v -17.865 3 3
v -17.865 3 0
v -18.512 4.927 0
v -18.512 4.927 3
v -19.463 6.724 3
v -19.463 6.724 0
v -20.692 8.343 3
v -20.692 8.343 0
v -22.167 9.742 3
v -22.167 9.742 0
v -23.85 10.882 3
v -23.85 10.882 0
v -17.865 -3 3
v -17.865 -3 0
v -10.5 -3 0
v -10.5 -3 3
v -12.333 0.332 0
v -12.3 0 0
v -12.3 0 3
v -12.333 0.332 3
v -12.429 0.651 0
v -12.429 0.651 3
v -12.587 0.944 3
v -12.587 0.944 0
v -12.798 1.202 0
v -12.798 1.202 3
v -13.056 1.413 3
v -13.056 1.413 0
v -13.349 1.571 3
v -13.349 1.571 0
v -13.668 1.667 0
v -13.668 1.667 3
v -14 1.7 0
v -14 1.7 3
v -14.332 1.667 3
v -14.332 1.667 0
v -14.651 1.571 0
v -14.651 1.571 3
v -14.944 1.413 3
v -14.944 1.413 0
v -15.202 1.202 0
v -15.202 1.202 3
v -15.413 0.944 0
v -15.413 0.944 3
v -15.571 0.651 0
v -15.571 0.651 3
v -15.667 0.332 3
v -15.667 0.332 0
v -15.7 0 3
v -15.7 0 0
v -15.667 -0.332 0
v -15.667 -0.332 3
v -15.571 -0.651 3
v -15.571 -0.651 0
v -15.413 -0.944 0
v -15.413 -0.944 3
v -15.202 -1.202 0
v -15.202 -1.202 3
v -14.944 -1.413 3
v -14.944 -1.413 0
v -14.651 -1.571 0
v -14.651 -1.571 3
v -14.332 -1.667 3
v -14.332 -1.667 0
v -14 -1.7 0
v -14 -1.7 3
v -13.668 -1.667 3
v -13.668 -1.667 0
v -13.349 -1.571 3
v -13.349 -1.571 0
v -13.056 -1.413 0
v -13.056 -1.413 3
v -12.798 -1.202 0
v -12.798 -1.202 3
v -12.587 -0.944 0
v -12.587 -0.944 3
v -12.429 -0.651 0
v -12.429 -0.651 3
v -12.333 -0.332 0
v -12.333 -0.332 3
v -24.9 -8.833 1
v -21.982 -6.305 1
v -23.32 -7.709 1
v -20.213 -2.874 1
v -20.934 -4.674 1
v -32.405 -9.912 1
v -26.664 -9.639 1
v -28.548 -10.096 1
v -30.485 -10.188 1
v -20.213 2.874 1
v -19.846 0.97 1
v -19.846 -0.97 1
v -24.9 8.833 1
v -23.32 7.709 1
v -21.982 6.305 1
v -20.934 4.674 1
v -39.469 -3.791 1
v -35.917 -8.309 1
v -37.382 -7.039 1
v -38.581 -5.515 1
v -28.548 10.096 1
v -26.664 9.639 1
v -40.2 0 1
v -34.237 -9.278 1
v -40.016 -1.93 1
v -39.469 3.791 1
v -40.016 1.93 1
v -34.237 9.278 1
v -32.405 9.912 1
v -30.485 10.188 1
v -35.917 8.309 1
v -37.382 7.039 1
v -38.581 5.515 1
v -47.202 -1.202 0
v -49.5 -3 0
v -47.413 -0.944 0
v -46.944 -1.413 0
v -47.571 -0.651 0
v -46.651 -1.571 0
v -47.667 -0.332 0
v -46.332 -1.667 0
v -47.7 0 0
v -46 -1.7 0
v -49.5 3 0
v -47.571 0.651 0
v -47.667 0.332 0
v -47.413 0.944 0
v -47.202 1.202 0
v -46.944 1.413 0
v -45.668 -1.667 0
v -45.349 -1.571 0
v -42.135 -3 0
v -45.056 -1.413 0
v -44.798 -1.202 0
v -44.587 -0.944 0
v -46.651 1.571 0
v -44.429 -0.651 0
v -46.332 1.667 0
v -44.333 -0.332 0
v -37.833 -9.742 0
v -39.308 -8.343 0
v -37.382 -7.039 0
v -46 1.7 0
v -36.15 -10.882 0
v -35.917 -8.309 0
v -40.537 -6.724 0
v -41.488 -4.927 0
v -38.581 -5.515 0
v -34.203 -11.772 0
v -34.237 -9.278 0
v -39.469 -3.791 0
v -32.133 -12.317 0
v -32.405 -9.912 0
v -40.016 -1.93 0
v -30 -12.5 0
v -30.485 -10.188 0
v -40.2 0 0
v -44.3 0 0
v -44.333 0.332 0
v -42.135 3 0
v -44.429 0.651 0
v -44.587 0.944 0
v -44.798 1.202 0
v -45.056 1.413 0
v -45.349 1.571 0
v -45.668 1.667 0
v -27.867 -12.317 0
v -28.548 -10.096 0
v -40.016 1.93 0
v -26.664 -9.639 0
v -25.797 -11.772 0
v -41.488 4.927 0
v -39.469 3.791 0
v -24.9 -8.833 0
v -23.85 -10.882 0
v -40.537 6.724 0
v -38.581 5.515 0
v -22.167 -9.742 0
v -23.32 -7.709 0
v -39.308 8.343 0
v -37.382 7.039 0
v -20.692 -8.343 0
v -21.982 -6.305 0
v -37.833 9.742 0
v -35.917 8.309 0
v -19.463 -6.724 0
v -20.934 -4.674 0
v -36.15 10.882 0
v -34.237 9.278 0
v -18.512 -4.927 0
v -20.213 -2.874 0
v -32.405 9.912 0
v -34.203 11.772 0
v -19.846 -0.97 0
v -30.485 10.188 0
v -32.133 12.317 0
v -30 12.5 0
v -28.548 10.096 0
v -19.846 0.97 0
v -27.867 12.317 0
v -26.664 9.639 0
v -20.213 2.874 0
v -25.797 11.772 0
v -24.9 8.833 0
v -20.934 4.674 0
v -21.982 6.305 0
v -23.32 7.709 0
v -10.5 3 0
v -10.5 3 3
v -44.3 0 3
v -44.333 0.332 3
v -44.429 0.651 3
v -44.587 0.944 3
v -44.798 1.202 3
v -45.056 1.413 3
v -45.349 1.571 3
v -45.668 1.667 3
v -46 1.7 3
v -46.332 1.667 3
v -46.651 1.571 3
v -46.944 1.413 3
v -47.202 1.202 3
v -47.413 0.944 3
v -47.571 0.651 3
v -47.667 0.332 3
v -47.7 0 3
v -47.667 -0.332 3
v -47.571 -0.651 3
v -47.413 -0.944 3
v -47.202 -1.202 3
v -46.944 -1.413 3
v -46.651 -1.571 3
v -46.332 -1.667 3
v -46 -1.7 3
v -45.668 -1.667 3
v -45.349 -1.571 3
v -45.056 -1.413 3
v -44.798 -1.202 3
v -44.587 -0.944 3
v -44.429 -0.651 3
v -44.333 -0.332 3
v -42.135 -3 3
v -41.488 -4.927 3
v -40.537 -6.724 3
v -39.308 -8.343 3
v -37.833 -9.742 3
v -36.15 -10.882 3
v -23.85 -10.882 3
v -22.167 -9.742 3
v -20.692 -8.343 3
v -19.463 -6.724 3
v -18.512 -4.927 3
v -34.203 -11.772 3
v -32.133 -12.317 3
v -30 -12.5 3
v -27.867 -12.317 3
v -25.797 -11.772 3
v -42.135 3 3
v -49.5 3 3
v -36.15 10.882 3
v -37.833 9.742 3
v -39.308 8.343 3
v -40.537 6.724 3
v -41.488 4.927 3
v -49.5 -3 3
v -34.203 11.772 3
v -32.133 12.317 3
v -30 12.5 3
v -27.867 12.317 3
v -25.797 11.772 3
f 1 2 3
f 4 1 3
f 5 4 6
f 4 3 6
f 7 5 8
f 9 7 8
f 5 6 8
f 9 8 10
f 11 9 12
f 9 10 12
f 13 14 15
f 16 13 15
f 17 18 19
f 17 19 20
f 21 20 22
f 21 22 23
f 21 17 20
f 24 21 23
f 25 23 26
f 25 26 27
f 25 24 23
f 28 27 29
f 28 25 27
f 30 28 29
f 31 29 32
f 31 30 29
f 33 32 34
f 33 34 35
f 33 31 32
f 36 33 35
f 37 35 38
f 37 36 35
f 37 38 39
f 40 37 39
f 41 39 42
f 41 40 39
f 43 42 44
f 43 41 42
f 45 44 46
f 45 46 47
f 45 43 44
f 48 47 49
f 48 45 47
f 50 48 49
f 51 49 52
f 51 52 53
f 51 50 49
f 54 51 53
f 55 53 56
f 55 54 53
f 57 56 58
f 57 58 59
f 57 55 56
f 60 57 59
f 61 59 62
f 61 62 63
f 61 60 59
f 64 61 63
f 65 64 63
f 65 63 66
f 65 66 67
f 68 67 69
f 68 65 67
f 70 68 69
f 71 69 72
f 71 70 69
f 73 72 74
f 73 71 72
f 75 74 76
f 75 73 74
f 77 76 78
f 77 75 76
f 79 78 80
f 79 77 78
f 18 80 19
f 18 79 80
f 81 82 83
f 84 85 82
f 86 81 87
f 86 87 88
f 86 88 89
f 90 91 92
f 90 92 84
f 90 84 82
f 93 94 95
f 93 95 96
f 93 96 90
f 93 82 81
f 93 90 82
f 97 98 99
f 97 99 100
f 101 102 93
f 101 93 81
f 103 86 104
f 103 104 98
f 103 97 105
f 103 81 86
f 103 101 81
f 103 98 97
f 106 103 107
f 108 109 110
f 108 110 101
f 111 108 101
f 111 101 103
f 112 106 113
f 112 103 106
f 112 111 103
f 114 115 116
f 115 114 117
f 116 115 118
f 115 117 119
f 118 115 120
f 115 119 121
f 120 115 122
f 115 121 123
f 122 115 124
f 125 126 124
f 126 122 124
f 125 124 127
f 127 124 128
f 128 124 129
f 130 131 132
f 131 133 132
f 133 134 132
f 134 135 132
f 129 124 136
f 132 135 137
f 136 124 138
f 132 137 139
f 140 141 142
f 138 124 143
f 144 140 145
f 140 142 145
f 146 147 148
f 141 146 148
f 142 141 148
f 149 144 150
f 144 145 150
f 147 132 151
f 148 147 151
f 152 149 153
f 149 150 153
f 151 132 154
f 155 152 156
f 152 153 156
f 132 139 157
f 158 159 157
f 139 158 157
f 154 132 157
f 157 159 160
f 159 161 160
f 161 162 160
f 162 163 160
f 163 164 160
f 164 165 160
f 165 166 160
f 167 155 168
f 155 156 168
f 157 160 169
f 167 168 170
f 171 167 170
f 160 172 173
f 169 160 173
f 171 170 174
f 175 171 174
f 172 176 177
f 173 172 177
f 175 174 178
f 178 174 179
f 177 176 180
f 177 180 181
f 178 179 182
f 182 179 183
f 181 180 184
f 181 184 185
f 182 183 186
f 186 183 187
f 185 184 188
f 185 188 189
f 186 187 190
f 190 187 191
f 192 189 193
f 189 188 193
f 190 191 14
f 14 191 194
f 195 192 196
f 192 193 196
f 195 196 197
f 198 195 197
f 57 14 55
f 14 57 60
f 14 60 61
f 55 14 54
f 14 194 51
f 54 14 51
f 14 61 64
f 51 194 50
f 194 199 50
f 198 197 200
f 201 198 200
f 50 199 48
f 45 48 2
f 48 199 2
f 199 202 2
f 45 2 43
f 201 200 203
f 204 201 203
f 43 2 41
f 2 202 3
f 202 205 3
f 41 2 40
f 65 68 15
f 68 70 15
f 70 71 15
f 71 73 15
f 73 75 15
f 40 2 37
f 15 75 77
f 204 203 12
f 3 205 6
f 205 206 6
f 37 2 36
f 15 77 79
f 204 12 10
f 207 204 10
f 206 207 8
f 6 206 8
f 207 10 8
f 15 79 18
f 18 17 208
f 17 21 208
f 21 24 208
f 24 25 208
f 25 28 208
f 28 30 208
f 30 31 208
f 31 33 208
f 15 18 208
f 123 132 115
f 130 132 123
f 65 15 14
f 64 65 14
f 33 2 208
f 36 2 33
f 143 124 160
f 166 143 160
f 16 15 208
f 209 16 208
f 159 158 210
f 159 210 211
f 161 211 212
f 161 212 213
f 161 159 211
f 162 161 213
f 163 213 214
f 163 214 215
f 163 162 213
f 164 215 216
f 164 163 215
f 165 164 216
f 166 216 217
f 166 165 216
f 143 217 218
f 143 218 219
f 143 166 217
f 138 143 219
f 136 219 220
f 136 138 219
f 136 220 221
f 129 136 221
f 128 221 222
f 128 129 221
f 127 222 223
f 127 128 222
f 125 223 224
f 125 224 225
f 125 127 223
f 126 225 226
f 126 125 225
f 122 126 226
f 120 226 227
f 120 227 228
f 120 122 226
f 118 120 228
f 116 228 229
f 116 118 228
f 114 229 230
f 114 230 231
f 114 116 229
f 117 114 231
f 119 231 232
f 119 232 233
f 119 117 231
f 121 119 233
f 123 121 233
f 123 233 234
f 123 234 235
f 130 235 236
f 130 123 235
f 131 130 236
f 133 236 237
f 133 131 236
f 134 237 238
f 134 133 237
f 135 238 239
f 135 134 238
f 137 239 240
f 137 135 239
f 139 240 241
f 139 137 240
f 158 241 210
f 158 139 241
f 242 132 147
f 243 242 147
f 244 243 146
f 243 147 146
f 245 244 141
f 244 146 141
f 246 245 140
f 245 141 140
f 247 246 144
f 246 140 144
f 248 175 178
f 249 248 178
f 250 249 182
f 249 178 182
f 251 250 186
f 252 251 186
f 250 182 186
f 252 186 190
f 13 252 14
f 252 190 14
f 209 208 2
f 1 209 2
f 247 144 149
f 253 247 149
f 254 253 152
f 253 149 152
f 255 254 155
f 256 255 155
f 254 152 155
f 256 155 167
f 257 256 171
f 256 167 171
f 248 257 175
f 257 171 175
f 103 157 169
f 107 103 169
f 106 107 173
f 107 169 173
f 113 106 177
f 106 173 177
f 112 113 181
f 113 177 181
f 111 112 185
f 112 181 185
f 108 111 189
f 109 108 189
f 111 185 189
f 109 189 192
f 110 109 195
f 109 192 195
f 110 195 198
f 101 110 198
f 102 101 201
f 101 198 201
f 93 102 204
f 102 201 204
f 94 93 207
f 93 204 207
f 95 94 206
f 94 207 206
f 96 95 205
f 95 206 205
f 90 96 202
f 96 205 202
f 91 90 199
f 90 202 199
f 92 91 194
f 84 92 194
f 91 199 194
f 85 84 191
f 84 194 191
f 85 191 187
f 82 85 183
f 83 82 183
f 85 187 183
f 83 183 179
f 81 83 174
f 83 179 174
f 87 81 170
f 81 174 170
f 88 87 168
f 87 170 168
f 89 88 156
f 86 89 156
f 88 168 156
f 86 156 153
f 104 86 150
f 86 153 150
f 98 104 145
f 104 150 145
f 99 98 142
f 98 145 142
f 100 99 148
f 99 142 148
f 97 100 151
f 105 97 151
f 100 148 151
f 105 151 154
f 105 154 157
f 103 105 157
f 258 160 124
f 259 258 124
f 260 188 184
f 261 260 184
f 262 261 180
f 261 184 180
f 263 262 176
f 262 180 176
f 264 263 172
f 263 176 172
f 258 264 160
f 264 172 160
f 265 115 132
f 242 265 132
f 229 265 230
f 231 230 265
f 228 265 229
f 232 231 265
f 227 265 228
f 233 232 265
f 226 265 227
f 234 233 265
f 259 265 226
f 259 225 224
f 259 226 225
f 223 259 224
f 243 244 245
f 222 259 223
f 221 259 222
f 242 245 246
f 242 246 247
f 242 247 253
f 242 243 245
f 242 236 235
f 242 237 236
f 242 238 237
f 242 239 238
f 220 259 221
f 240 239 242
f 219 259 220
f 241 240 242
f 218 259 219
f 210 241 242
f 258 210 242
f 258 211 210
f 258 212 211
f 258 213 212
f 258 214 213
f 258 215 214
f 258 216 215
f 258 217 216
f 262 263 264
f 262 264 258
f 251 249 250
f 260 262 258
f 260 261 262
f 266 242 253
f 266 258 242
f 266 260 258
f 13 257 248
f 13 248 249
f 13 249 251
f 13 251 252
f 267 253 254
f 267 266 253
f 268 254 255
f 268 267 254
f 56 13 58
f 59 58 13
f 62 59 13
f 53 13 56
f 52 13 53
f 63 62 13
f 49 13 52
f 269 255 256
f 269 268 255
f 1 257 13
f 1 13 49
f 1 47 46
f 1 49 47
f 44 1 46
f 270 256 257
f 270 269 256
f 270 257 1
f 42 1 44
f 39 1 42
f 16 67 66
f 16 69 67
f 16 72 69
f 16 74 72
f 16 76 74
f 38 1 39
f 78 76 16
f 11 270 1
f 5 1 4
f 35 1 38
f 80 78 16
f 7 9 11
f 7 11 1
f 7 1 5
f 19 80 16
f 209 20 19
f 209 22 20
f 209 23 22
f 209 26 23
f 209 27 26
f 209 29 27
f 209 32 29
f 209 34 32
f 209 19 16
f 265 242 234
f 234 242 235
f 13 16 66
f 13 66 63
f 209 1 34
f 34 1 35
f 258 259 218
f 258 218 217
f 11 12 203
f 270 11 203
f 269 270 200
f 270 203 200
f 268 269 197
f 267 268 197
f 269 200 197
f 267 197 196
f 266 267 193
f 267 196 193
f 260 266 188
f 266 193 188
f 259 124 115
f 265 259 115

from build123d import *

# Parameters (mm, degrees)
SKETCH2_R           = 1.7
BOSS_EXTRUDE1_DEPTH = 3
SKETCH3_R           = 10.2
CUT_EXTRUDE1_DEPTH  = 1


with BuildPart() as part:
    # Sketch2 → Boss-Extrude1 (new body)
    # profile 1 of 7: a face of its own
    with BuildSketch(Plane.XY):
        with BuildLine():
            ThreePointArc((-17.5, 0), (-17.591670867, -1.511081774), (-17.8653389, -3))
            Line((-17.8653389, -3), (-10.5, -3))
            Line((-10.5, -3), (-10.5, 3))
            Line((-10.5, 3), (-17.8653389, 3))
            ThreePointArc((-17.8653389, 3), (-17.591670867, 1.511081774), (-17.5, 0))
        make_face()
        with Locations((-14, 0)):
            Circle(SKETCH2_R, mode=Mode.SUBTRACT)
    # profile 2 of 7: a face of its own
    with BuildSketch(Plane.XY):
        with BuildLine():
            ThreePointArc((-19.8, 0), (-20.868461247, -4.544777222), (-23.85, -8.137413594))
            Line((-23.85, -8.137413594), (-23.85, -10.882439984))
            ThreePointArc((-23.85, -10.882439984), (-20.044327099, -7.558741767), (-17.8653389, -3))
            ThreePointArc((-17.8653389, -3), (-17.591670867, -1.511081774), (-17.5, 0))
            ThreePointArc((-17.5, 0), (-17.591670867, 1.511081774), (-17.8653389, 3))
            ThreePointArc((-17.8653389, 3), (-20.044327099, 7.558741767), (-23.85, 10.882439984))
            Line((-23.85, 10.882439984), (-23.85, 8.137413594))
            ThreePointArc((-23.85, 8.137413594), (-20.868461247, 4.544777222), (-19.8, 0))
        make_face()
    # profile 3 of 7: a face of its own
    with BuildSketch(Plane.XY):
        with BuildLine():
            Line((-23.85, -10.882439984), (-23.85, -8.137413594))
            ThreePointArc((-23.85, -8.137413594), (-30, -10.2), (-36.15, -8.137413594))
            Line((-36.15, -8.137413594), (-36.15, -10.882439984))
            ThreePointArc((-36.15, -10.882439984), (-30, -12.5), (-23.85, -10.882439984))
        make_face()
    # profile 4 of 7: a face of its own
    with BuildSketch(Plane.XY):
        with BuildLine():
            Line((-36.15, -10.882439984), (-36.15, -8.137413594))
            ThreePointArc((-36.15, -8.137413594), (-40.2, 0), (-36.15, 8.137413594))
            Line((-36.15, 8.137413594), (-36.15, 10.882439984))
            ThreePointArc((-36.15, 10.882439984), (-39.955672901, 7.558741767), (-42.1346611, 3))
            ThreePointArc((-42.1346611, 3), (-42.5, 0), (-42.1346611, -3))
            ThreePointArc((-42.1346611, -3), (-39.955672901, -7.558741767), (-36.15, -10.882439984))
        make_face()
    # profile 5 of 7: a face of its own
    with BuildSketch(Plane.XY):
        with BuildLine():
            ThreePointArc((-36.15, -8.137413594), (-30, -10.2), (-23.85, -8.137413594))
            ThreePointArc((-23.85, -8.137413594), (-20.868461247, -4.544777222), (-19.8, 0))
            ThreePointArc((-19.8, 0), (-20.868461247, 4.544777222), (-23.85, 8.137413594))
            ThreePointArc((-23.85, 8.137413594), (-30, 10.2), (-36.15, 8.137413594))
            ThreePointArc((-36.15, 8.137413594), (-40.2, 0), (-36.15, -8.137413594))
        make_face()
    # profile 6 of 7: a face of its own
    with BuildSketch(Plane.XY):
        with BuildLine():
            Line((-36.15, 10.882439984), (-36.15, 8.137413594))
            ThreePointArc((-36.15, 8.137413594), (-30, 10.2), (-23.85, 8.137413594))
            Line((-23.85, 8.137413594), (-23.85, 10.882439984))
            ThreePointArc((-23.85, 10.882439984), (-30, 12.5), (-36.15, 10.882439984))
        make_face()
    # profile 7 of 7: a face of its own
    with BuildSketch(Plane.XY):
        with BuildLine():
            Line((-49.5, -3), (-42.1346611, -3))
            ThreePointArc((-42.1346611, -3), (-42.5, 0), (-42.1346611, 3))
            Line((-42.1346611, 3), (-49.5, 3))
            Line((-49.5, 3), (-49.5, -3))
        make_face()
        with Locations((-46, 0)):
            Circle(SKETCH2_R, mode=Mode.SUBTRACT)
    extrude(amount=BOSS_EXTRUDE1_DEPTH)

    # Sketch3 → Cut-Extrude1 (cut)
    with BuildSketch(Plane(origin=(0, 0, 0), x_dir=(-1, 0, 0), z_dir=(0, 0, -1))):
        with Locations((30, 0)):
            Circle(SKETCH3_R)
    extrude(amount=-CUT_EXTRUDE1_DEPTH, mode=Mode.SUBTRACT)


solid = part.part
